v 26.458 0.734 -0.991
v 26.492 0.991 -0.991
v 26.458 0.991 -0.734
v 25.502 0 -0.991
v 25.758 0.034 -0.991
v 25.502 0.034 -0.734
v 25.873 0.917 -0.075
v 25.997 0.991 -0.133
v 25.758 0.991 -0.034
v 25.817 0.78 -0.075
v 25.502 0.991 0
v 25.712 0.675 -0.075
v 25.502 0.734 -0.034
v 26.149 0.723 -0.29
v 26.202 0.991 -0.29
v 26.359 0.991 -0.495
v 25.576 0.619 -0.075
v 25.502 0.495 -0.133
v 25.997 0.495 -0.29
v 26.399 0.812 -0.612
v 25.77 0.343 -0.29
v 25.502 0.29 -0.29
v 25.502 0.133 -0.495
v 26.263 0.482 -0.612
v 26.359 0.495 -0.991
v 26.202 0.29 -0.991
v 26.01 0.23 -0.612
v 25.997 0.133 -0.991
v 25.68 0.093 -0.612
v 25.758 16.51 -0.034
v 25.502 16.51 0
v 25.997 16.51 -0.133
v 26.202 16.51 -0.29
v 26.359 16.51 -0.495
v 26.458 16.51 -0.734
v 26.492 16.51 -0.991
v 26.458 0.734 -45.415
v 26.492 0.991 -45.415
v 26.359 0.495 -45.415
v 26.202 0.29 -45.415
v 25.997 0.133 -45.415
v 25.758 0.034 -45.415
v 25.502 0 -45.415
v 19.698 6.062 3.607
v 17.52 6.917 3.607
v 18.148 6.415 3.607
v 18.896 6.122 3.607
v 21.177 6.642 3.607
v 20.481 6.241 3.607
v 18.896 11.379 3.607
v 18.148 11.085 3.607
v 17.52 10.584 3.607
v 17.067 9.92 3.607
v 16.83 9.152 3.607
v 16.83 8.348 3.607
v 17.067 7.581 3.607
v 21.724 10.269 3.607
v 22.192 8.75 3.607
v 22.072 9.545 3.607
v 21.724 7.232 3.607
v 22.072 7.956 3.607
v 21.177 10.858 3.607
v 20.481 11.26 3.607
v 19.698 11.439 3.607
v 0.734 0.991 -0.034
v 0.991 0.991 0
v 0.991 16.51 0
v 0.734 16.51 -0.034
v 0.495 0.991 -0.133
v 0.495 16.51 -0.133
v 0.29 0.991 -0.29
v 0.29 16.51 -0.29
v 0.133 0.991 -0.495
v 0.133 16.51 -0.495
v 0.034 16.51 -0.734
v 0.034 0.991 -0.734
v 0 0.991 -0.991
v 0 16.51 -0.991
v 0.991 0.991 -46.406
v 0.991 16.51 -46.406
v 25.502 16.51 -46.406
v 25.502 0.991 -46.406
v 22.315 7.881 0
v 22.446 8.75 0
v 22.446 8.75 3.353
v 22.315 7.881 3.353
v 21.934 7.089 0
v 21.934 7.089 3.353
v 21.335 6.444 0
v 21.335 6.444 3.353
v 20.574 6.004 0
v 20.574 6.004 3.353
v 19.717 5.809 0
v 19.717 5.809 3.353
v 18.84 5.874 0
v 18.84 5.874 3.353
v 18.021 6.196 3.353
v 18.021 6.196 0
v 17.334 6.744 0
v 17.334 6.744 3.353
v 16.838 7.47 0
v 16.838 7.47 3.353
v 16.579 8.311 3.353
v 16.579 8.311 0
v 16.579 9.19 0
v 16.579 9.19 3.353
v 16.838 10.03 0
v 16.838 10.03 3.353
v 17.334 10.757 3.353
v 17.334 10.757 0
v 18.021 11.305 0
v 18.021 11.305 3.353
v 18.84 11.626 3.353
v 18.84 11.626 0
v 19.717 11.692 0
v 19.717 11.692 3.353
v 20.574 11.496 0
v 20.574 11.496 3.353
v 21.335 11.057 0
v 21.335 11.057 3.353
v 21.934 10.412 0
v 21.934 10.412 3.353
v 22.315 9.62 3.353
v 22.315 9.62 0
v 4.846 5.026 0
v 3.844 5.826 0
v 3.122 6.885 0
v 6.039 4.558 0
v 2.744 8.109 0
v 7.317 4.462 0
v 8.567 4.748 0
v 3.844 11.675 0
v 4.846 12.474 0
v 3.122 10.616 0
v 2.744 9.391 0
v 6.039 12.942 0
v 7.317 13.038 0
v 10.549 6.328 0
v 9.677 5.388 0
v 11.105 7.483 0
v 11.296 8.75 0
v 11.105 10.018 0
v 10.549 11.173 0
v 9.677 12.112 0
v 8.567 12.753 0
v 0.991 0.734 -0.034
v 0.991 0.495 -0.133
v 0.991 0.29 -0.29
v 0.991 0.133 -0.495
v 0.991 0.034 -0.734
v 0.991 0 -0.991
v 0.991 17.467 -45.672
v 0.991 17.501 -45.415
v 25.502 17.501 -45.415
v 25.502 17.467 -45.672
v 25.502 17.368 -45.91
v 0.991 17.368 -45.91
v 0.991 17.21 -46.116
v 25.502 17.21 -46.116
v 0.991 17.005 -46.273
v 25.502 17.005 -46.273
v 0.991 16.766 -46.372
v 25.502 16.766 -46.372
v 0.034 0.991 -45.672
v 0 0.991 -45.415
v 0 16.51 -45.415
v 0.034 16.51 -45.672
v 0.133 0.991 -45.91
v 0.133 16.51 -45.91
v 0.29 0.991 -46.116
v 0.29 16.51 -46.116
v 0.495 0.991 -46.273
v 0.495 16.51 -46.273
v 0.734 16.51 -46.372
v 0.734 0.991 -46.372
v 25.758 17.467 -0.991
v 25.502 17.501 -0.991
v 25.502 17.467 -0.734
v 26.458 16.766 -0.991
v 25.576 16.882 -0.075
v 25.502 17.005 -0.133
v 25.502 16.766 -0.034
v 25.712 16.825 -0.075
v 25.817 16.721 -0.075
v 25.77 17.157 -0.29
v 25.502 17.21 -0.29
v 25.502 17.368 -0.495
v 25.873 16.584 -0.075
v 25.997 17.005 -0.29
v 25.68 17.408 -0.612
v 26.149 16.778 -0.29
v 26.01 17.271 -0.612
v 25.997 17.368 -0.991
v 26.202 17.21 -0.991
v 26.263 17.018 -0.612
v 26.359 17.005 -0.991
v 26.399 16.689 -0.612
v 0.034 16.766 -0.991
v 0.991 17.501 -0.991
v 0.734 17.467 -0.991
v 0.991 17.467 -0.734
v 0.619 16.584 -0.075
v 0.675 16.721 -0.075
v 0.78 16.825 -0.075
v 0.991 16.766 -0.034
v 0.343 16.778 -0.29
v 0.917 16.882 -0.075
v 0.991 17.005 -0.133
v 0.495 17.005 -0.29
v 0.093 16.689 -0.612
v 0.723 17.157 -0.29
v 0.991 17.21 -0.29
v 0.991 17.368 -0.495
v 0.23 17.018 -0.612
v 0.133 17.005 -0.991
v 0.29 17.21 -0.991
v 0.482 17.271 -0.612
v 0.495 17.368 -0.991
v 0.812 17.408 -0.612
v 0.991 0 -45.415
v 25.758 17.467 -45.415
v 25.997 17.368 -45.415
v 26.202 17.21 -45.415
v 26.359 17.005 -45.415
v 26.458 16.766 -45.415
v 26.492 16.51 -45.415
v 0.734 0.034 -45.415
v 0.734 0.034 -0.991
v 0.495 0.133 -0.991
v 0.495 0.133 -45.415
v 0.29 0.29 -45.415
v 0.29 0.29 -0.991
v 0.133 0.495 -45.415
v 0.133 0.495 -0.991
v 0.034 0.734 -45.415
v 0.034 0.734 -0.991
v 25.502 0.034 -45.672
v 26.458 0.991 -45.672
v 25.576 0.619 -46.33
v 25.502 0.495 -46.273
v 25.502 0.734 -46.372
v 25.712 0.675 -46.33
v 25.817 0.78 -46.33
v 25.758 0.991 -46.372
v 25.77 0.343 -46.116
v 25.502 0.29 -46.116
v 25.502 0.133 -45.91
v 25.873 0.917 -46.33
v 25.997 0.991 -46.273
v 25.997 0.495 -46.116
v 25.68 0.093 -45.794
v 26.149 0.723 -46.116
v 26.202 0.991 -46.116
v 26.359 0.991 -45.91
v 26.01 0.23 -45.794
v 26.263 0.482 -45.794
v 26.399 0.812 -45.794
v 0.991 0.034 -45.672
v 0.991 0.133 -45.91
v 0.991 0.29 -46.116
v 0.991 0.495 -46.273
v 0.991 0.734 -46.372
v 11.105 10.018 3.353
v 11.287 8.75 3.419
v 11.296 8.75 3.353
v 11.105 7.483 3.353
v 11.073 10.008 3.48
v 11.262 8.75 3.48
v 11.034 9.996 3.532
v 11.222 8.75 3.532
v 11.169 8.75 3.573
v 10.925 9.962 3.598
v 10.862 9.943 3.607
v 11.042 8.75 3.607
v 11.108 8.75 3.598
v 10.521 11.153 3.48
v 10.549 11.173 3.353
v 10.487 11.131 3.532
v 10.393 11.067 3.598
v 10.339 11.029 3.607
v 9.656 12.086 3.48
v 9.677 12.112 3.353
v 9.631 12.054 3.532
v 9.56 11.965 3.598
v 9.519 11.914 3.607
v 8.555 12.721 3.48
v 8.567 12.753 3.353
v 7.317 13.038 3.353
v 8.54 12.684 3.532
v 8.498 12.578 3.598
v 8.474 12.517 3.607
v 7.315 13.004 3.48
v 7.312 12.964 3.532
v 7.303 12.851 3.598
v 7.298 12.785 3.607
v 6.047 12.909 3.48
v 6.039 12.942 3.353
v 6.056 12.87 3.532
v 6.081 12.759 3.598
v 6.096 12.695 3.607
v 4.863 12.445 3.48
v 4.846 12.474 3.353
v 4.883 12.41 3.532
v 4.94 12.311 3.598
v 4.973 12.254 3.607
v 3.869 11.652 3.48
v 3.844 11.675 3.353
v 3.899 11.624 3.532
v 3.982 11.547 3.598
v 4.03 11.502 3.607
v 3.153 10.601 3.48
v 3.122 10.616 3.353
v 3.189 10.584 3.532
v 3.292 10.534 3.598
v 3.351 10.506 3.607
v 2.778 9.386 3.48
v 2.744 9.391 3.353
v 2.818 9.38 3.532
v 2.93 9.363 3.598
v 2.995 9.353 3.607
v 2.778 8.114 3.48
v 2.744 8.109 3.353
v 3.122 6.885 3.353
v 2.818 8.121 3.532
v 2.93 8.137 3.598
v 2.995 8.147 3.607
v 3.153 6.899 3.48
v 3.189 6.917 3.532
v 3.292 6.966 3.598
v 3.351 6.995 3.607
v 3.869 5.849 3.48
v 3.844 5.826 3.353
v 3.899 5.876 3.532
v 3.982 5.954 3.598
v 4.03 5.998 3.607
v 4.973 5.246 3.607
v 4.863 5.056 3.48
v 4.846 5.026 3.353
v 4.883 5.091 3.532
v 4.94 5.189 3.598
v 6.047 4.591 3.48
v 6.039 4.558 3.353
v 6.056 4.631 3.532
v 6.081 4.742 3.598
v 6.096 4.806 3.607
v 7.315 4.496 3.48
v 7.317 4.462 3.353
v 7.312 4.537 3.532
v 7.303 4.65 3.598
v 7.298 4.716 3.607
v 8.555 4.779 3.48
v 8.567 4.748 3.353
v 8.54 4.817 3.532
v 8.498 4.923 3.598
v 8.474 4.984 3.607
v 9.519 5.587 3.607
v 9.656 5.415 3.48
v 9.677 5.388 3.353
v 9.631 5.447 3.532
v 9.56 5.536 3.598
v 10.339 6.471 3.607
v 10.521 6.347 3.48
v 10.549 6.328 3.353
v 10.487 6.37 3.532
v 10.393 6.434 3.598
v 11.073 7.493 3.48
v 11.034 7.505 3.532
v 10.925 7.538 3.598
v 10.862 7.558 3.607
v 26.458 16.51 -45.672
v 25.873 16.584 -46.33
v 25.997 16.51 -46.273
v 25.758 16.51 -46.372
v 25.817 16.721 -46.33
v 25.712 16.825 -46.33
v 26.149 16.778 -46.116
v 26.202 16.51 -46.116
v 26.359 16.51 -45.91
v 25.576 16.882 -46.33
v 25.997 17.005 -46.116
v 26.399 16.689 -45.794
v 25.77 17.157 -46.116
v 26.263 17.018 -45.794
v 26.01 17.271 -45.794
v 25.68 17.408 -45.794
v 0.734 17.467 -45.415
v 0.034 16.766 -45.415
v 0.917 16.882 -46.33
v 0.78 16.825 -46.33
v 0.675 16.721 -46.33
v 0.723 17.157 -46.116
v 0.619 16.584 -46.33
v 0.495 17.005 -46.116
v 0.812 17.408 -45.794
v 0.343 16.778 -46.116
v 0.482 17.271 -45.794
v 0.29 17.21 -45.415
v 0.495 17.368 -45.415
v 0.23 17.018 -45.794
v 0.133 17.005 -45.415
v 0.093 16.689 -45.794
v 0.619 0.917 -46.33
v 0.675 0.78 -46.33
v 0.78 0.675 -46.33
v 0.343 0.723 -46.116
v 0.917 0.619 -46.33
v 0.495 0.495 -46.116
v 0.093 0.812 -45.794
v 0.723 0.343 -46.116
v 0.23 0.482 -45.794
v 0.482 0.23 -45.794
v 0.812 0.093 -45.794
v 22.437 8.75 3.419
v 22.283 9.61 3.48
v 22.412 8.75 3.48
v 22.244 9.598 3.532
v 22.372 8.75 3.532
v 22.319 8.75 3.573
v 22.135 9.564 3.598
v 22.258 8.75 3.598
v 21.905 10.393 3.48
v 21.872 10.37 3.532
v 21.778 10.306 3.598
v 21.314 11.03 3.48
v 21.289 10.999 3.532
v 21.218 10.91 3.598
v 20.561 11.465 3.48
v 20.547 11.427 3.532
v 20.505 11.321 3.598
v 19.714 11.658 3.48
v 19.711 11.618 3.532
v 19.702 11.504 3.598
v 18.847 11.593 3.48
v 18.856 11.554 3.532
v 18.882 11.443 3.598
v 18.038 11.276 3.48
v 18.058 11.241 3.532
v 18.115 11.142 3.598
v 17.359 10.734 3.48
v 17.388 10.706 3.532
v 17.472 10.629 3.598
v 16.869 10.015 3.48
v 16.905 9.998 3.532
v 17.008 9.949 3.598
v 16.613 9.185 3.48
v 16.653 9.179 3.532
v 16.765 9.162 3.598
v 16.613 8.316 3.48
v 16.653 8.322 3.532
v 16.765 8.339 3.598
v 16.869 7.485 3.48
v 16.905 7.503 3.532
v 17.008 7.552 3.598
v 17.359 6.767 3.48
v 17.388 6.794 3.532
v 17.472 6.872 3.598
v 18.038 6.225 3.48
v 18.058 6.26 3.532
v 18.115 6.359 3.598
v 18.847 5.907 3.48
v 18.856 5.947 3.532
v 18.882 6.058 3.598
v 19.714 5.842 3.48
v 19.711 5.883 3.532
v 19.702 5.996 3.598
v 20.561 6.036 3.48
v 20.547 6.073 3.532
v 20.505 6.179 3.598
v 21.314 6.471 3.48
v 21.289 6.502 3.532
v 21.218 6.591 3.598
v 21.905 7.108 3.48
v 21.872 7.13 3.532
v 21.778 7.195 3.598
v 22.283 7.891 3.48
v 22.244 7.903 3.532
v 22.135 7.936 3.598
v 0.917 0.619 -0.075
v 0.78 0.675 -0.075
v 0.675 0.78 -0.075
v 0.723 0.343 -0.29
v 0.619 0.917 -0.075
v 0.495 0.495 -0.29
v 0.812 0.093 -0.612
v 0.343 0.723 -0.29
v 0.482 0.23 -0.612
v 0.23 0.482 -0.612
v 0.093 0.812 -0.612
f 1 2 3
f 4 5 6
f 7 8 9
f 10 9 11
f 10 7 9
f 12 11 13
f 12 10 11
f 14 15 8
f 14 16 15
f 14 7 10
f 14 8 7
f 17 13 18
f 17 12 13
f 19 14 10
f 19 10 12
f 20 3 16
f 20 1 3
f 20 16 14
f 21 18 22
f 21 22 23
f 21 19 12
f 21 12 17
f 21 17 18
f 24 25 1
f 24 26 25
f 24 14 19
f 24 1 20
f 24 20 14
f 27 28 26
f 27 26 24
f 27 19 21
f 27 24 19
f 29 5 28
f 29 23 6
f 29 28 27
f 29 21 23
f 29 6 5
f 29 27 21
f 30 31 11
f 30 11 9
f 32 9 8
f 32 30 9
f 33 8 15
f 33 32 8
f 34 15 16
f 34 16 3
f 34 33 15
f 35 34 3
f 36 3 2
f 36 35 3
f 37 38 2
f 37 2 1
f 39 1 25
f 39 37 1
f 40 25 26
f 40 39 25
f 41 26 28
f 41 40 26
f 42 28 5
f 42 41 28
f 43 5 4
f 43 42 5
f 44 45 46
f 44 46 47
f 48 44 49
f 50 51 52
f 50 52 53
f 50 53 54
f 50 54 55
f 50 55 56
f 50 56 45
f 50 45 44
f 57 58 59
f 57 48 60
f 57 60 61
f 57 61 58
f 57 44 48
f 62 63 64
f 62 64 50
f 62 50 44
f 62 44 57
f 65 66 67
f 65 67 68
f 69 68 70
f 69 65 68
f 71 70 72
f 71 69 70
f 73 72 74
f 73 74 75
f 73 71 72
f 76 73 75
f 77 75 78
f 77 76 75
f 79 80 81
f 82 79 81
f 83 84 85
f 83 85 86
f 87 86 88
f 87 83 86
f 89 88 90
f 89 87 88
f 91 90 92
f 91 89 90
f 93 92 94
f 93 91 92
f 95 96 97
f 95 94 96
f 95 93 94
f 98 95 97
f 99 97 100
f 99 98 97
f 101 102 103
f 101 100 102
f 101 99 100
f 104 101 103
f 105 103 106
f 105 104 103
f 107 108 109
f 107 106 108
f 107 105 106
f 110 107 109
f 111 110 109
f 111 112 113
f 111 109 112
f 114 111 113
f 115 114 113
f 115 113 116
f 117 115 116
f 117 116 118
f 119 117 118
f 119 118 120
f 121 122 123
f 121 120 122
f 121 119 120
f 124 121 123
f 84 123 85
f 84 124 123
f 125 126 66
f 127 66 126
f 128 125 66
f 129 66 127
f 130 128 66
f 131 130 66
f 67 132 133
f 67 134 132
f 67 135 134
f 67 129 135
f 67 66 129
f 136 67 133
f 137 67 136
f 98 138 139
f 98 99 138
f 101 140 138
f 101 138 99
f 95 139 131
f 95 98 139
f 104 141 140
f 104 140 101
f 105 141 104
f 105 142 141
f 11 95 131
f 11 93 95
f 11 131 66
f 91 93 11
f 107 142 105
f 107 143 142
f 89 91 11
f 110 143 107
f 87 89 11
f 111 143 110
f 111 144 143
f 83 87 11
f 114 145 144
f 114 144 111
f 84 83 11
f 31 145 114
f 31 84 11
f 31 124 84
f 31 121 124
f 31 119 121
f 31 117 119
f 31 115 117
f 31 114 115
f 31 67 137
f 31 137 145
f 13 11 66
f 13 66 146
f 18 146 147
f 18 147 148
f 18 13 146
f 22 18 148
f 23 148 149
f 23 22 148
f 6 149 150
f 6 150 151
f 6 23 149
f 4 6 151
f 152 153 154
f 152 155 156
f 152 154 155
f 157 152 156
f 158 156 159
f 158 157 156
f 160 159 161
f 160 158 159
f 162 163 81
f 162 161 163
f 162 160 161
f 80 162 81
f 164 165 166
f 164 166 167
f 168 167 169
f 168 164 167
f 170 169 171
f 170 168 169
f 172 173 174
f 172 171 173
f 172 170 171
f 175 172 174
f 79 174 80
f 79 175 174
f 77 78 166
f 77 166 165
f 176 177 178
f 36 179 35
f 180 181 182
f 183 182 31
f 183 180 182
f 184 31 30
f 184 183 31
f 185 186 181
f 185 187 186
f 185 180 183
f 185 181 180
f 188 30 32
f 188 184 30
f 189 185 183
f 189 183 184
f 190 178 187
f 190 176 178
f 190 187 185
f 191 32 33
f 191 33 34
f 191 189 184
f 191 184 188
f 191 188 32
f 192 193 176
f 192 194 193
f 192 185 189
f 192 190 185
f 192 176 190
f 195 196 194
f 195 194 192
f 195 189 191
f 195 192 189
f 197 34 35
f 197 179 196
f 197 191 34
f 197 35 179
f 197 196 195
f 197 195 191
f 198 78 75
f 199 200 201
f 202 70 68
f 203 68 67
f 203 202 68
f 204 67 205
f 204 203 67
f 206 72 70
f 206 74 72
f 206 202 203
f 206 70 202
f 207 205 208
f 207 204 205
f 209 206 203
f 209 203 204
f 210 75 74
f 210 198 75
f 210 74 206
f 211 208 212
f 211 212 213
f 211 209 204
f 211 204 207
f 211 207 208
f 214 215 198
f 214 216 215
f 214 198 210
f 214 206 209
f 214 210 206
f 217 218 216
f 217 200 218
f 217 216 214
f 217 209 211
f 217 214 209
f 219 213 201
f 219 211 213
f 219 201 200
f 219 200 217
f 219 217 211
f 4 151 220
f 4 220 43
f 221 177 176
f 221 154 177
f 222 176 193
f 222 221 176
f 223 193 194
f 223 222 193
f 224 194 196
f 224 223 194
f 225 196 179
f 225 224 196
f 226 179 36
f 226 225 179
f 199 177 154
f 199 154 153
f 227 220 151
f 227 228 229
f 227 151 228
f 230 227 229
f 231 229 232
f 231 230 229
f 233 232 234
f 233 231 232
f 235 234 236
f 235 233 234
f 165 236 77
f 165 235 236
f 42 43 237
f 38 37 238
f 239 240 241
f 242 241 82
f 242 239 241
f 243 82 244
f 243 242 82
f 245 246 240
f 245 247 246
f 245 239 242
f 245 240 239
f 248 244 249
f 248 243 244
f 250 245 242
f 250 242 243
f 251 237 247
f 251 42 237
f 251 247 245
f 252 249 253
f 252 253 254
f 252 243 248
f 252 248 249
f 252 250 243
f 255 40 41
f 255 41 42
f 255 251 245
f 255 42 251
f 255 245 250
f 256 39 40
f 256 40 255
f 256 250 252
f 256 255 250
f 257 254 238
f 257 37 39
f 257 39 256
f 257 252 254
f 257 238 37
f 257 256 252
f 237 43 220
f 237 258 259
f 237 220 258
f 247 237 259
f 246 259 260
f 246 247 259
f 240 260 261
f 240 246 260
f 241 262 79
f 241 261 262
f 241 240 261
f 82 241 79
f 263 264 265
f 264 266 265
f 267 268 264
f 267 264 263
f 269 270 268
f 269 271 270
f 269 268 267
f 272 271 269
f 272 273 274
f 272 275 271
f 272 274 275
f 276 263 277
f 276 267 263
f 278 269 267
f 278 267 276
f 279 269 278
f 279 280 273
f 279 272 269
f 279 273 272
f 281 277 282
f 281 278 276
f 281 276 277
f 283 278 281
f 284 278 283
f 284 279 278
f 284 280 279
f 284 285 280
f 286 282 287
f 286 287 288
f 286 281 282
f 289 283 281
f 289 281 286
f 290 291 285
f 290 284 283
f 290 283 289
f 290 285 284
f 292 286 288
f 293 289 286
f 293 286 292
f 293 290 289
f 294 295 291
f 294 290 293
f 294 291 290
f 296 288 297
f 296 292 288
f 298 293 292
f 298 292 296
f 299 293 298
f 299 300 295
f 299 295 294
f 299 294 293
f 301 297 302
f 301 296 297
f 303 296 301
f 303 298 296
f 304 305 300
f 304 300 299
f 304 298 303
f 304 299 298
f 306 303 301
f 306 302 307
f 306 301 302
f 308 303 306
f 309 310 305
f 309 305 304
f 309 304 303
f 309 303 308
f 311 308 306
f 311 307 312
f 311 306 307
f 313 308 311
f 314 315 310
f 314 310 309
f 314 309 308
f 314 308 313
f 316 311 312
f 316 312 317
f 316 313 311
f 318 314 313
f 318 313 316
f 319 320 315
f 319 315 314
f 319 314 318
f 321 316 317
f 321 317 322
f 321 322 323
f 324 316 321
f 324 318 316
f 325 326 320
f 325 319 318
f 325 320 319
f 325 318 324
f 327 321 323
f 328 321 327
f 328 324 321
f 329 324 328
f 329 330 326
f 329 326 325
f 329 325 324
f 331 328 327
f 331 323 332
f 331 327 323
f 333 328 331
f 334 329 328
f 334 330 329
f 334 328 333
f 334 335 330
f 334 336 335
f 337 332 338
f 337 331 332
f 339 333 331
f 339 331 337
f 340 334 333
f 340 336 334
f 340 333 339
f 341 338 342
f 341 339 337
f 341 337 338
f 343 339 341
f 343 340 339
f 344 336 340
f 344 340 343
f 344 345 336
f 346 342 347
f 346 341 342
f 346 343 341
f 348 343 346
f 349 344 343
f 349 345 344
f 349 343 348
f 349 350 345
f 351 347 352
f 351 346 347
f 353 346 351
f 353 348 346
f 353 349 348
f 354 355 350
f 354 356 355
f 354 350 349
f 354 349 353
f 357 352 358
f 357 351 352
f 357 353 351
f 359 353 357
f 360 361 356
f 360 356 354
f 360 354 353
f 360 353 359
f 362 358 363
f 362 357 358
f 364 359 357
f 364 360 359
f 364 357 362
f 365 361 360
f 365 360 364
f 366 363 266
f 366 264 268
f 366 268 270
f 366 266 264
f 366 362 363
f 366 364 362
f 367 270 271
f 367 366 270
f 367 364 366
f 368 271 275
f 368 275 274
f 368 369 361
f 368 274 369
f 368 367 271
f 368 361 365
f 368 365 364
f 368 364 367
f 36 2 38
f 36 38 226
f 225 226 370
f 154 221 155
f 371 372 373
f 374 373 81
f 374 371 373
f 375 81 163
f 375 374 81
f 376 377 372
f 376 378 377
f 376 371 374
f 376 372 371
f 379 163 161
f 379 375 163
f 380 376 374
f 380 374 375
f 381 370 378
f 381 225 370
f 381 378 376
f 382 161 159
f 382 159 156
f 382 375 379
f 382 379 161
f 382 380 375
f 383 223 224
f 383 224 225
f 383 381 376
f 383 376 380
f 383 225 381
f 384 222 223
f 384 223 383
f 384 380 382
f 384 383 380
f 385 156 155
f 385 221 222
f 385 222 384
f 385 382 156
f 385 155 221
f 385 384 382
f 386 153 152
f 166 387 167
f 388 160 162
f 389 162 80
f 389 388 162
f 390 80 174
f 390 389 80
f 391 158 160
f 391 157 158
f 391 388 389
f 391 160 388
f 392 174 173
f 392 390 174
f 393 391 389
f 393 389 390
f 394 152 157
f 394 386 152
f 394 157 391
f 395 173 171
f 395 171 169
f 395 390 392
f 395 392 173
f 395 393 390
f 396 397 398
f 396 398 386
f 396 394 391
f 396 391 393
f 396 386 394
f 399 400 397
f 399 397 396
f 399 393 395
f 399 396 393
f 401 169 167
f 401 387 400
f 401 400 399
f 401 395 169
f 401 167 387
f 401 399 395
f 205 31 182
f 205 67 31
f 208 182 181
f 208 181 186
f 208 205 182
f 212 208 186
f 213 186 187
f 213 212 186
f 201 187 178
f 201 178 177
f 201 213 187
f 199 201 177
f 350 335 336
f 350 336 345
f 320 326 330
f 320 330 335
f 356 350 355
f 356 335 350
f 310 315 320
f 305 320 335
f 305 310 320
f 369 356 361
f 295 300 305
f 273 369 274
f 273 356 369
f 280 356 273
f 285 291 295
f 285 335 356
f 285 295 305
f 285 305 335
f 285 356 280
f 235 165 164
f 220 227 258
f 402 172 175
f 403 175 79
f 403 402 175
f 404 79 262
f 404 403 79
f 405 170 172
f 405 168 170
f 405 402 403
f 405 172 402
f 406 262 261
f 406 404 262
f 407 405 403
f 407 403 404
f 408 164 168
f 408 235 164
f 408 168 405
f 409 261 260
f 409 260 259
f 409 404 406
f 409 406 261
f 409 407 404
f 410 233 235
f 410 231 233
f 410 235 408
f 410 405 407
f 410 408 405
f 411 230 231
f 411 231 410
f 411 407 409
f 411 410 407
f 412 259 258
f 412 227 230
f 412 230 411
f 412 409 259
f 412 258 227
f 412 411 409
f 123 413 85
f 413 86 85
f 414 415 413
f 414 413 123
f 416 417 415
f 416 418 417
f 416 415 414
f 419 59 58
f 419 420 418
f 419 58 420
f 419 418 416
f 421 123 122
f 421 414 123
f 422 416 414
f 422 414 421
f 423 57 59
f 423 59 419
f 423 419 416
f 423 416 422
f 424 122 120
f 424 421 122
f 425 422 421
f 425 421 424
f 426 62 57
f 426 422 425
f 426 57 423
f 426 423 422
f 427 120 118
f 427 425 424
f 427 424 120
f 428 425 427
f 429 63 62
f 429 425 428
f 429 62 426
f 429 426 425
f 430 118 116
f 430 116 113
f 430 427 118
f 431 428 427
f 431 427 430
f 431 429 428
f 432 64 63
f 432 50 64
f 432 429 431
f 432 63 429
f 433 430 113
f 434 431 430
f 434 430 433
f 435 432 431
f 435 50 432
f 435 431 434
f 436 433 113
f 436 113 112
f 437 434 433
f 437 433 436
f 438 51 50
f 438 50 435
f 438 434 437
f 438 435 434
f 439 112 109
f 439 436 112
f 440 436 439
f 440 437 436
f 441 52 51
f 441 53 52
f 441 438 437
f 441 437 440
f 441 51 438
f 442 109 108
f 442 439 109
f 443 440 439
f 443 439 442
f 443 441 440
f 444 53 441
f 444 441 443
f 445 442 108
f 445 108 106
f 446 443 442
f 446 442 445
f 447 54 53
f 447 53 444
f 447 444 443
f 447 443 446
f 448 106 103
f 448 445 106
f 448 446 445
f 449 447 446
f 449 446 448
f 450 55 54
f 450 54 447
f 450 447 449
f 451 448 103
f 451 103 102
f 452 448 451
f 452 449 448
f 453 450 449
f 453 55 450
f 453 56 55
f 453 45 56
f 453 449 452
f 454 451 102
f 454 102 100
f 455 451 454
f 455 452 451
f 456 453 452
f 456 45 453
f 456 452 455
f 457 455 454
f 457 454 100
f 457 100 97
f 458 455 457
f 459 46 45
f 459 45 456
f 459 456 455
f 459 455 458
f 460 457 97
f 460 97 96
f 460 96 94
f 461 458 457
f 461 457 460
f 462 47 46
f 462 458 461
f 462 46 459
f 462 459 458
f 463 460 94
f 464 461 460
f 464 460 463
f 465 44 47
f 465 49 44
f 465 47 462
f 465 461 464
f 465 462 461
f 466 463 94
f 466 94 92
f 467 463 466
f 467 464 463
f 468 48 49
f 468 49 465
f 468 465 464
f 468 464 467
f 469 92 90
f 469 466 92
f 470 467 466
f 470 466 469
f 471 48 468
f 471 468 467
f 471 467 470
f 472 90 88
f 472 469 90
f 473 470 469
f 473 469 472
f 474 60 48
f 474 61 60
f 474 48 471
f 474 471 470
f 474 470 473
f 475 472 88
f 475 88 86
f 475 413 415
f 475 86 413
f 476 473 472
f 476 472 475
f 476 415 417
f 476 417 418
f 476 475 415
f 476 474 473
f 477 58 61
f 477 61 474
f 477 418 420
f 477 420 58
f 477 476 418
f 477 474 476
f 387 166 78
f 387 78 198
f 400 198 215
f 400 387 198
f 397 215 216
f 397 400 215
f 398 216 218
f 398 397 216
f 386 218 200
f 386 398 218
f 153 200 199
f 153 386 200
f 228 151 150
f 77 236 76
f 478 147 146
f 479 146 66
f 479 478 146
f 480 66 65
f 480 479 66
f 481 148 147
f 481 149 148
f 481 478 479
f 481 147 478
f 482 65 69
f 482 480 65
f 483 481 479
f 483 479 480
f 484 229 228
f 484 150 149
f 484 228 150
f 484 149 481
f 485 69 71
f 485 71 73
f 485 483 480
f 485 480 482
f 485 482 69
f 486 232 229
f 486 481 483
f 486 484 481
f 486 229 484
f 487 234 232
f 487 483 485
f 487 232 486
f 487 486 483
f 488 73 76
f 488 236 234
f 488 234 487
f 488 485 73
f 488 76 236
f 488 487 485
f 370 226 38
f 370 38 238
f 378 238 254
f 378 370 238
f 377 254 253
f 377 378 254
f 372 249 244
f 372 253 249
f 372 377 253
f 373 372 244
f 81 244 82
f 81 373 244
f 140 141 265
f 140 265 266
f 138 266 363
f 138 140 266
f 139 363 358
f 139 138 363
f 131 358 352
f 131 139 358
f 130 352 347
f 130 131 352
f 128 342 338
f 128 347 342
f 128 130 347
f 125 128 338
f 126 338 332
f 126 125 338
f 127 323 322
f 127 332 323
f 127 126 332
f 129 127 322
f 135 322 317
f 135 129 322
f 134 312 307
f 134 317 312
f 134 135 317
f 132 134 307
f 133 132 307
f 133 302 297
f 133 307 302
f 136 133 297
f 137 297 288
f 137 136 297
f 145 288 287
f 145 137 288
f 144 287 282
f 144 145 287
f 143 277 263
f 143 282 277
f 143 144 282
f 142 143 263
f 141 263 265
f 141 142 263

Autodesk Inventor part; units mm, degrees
ref_plane "YZ Plane" through (0, 0, 0) normal (1, 0, 0) x (0, 1, 0)
ref_plane "XZ Plane" through (0, 0, 0) normal (0, 1, 0) x (-1, 0, 0)
sketch "Sketch1" plane through (0, 0, 0) normal (0, 0, 1) x (1, 0, 0)
  line L0 (0, 0) -> (26.4922, 0)
  line L1 (26.4922, 0) -> (26.4922, 17.5006)
  line L2 (26.4922, 17.5006) -> (0, 17.5006)
  line L3 (0, 17.5006) -> (0, 0)
  dimension "d0" = 26.4922
  dimension "d1" = 17.5006
extrude "Extrusion1" add sketch "Sketch1" against normal blind 46.4058
fillet "Fillet1" radius 0.9906 12 edges at (0, 17.5006, -23.2029) (0, 0, -23.2029) (0, 8.7503, 0) (0, 8.7503, -46.4058) (26.4922, 17.5006, -23.2029) (13.2461, 17.5006, 0) (13.2461, 17.5006, -46.4058) (26.4922, 0, -23.2029) (26.4922, 8.7503, 0) (26.4922, 8.7503, -46.4058) (13.2461, 0, 0) (13.2461, 0, -46.4058)
sketch "Sketch2" plane through (0, 0, 0) normal (0, 0, 1) x (1, 0, 0)
  line L0 (0.9906, 16.51) -> (25.5016, 16.51) projected
  line L1 (0.9906, 0.9906) -> (0.9906, 16.51) projected
  line L2 (0.9961, 16.5003) -> (25.4961, 16.5003)
  line L3 (0.9961, 16.5003) -> (0.9961, 1.0003)
  line L4 (0.9961, 1.0003) -> (25.4961, 1.0003)
  line L5 (25.4961, 1.0003) -> (25.4961, 16.5003)
  circle A0 centre (6.9961, 8.7503) radius 4.3
  circle A1 centre (19.4961, 8.7503) radius 2.95
  point P0 (0, 0)
  point P1 (13.2461, 8.7503)
  point P2 (13.2461, 8.7503)
  point P3 (13.2461, 16.51)
  point P4 (0.9906, 8.7503)
extrude "Extrusion2" add sketch "Sketch2" along normal blind 3.6068 contours A0 | A1
fillet "Fillet2" radius 0.254 2 edges at (2.6961, 8.7503, 3.6068) (16.5461, 8.7503, 3.6068)
ref_plane "Work Plane1" through (13.2461, 0.9906, -45.4152) normal (1, 0, 0) x (0, 0, -1)
properties part number "276-2243" material "ABS Plastic"
